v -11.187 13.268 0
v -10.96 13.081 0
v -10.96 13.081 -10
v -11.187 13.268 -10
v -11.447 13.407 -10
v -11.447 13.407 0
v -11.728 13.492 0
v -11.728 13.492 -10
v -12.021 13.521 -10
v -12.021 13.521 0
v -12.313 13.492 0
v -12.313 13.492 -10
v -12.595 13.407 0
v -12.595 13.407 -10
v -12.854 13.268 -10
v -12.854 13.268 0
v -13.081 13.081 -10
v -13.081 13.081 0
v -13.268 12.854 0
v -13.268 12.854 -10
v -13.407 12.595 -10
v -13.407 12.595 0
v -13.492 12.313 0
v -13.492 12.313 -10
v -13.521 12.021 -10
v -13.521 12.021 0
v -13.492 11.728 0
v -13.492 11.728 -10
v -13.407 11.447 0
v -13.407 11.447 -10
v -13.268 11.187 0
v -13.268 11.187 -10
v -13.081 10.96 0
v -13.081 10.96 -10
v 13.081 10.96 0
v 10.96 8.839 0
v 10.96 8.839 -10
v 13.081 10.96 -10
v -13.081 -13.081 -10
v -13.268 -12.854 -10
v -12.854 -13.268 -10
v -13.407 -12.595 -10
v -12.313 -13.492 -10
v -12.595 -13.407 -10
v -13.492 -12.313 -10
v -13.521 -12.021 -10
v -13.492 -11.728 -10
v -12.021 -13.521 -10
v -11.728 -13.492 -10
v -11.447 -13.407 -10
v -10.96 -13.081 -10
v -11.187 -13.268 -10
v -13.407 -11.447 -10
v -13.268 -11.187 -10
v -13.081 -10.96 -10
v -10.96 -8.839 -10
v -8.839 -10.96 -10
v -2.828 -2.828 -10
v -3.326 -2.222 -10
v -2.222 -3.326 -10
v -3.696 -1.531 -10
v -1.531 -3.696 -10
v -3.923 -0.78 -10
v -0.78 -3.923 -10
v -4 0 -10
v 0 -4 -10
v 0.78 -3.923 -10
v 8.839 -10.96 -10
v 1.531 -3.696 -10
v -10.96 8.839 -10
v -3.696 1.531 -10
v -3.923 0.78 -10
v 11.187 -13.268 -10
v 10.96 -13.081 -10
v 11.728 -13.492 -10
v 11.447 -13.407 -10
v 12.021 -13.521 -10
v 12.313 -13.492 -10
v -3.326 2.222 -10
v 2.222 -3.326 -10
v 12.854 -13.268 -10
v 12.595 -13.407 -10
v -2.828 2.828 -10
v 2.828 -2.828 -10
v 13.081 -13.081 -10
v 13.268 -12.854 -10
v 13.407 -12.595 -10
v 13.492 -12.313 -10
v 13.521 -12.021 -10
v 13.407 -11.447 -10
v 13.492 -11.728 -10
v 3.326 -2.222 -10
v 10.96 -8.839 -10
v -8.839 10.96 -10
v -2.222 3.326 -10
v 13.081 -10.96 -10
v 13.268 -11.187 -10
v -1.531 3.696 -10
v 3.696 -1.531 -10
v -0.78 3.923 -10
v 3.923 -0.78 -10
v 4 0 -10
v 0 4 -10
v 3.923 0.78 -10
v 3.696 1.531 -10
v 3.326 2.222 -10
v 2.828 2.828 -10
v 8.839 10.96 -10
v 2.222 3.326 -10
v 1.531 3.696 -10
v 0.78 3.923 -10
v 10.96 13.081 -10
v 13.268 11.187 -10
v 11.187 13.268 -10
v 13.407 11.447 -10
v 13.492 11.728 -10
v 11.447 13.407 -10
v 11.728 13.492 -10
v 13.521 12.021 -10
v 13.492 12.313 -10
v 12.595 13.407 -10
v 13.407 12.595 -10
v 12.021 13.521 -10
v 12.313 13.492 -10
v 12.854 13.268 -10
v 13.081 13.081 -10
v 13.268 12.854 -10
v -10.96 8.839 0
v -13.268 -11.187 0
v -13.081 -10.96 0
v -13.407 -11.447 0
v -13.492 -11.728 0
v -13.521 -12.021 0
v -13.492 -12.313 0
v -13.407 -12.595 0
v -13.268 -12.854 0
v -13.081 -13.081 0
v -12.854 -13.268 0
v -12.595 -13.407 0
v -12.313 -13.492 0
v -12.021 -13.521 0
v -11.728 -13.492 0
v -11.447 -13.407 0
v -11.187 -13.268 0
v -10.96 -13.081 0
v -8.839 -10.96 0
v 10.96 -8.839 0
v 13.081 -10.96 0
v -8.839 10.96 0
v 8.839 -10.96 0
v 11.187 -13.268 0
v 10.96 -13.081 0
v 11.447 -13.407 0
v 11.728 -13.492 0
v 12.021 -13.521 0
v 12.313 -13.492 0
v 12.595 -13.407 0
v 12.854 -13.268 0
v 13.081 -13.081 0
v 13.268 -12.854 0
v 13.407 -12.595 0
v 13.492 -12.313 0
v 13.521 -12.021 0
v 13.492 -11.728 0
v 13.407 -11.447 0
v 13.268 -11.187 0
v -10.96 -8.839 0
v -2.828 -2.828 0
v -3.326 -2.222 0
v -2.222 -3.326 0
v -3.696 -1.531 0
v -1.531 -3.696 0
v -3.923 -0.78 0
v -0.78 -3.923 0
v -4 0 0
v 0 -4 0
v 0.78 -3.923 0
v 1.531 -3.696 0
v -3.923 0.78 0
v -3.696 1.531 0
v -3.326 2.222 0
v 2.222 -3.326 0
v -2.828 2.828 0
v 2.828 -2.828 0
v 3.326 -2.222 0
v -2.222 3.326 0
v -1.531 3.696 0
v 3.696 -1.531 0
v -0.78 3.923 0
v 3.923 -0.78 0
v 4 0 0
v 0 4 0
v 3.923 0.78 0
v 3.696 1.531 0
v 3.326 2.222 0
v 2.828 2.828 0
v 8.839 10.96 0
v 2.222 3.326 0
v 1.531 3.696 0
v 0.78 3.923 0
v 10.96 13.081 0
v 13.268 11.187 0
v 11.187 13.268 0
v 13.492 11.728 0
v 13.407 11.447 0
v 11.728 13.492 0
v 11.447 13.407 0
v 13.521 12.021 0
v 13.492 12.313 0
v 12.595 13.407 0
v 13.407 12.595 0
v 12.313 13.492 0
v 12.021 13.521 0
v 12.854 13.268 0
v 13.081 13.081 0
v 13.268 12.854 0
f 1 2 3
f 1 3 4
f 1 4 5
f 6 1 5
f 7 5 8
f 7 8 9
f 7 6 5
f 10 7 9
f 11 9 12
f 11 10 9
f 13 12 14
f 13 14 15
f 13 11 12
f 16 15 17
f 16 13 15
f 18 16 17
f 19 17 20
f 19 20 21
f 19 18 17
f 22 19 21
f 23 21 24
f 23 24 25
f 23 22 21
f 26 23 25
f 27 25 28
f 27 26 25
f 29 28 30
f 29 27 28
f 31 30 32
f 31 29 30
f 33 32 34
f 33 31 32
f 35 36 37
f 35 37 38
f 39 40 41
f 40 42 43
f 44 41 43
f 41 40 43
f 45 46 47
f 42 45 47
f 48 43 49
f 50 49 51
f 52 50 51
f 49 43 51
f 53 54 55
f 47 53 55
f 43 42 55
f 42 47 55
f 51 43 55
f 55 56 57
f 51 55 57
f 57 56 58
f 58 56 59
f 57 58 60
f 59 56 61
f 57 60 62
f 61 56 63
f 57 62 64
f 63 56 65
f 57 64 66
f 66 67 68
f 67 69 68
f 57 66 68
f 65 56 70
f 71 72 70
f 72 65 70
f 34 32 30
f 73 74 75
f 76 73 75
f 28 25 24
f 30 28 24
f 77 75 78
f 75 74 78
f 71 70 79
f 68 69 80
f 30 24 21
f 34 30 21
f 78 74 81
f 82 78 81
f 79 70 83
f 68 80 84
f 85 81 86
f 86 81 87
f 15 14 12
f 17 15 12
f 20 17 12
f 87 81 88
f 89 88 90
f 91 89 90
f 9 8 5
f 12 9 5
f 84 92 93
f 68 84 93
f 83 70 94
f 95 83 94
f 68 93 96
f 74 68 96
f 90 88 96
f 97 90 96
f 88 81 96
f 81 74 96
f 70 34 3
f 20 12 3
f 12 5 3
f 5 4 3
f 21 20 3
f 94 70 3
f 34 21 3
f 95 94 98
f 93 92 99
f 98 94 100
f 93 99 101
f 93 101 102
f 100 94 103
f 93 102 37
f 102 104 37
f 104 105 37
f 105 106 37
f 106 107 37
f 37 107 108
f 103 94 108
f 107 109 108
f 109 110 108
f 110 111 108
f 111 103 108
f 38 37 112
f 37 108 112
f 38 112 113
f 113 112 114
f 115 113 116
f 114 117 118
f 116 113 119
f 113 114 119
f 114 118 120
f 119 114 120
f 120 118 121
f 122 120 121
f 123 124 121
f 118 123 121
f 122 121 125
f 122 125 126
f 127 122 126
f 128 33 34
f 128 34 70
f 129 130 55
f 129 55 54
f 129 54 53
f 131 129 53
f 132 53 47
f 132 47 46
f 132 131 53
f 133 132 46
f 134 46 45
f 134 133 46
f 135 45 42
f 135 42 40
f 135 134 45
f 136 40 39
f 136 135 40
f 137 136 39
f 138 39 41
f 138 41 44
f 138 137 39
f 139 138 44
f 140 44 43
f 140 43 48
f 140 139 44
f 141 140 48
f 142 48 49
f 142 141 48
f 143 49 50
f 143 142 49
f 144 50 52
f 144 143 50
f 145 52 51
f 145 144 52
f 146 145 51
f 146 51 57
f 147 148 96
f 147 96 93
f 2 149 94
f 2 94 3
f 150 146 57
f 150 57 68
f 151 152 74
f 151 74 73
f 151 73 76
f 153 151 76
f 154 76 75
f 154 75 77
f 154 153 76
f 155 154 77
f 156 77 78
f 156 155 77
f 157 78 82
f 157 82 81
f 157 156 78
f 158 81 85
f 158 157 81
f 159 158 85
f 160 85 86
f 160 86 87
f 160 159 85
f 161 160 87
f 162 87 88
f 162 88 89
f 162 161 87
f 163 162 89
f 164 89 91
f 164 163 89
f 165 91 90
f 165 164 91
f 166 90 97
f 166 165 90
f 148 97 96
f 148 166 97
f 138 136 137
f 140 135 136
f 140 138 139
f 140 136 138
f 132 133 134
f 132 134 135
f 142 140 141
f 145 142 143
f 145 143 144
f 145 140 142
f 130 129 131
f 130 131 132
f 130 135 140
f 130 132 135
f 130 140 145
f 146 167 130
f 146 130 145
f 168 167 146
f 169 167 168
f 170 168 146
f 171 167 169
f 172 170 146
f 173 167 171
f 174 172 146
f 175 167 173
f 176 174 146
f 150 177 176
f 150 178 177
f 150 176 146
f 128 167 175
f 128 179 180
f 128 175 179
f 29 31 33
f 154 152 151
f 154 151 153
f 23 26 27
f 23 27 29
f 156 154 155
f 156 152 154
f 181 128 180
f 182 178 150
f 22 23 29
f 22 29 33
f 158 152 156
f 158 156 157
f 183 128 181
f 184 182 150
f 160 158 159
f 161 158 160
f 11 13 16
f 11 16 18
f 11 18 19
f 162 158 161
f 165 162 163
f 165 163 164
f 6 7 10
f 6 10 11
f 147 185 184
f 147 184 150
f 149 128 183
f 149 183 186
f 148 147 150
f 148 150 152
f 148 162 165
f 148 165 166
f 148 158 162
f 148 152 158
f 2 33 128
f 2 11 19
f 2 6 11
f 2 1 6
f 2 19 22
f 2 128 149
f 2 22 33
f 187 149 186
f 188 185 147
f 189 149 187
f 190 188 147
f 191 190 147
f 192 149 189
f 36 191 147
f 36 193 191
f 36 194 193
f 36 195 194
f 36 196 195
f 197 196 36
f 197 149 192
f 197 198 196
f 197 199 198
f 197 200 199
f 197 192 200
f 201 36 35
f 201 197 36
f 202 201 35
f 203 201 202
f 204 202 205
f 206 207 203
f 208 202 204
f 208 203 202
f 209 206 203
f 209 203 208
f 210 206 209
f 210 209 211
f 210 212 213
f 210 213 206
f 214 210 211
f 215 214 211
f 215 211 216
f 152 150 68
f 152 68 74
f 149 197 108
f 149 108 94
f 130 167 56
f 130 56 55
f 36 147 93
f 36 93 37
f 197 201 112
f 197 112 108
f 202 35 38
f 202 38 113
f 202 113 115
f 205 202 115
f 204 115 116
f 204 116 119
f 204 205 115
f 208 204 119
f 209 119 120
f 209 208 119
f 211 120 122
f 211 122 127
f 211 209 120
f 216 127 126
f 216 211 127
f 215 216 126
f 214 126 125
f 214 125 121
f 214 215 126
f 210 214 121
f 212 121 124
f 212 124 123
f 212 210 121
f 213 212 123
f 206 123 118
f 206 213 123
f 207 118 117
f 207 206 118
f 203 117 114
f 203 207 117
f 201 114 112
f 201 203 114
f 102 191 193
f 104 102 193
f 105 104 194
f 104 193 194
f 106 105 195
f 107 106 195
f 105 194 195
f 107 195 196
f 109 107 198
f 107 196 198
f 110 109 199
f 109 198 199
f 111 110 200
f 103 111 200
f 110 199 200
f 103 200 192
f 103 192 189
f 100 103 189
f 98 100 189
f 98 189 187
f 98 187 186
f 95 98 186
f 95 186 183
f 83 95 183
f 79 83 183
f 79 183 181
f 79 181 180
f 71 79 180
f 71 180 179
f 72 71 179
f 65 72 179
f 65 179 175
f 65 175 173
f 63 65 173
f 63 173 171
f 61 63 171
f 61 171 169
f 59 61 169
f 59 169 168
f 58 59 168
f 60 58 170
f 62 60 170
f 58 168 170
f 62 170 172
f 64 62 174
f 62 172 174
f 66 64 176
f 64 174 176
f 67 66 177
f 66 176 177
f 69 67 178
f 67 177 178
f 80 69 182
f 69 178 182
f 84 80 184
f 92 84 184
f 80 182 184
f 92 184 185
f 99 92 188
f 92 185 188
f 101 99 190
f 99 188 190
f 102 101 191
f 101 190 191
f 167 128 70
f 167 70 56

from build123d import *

# Parameters (mm, degrees)
BOSS_EXTRUDE1_DEPTH = 10
SKETCH4_R           = 4
CUT_EXTRUDE1_DEPTH  = 11


with BuildPart() as part:
    # Sketch3 → Boss-Extrude1 (new body)
    with BuildSketch(Plane.XY):
        with BuildLine():
            Line((-13.081475452, 10.960155108), (-10.960155108, 8.838834765))
            Line((-10.960155108, 8.838834765), (-10.960155108, -8.838834765))
            Line((-10.960155108, -8.838834765), (-13.081475452, -10.960155108))
            ThreePointArc((-13.081475452, -10.960155108), (-13.081475452, -13.081475452), (-10.960155108, -13.081475452))
            Line((-10.960155108, -13.081475452), (-8.838834765, -10.960155108))
            Line((-8.838834765, -10.960155108), (8.838834765, -10.960155108))
            Line((8.838834765, -10.960155108), (10.960155108, -13.081475452))
            ThreePointArc((10.960155108, -13.081475452), (13.081475452, -13.081475452), (13.081475452, -10.960155108))
            Line((13.081475452, -10.960155108), (10.960155108, -8.838834765))
            Line((10.960155108, -8.838834765), (10.960155108, 8.838834765))
            Line((10.960155108, 8.838834765), (13.081475452, 10.960155108))
            ThreePointArc((13.081475452, 10.960155108), (13.081475452, 13.081475452), (10.960155108, 13.081475452))
            Line((10.960155108, 13.081475452), (8.838834765, 10.960155108))
            Line((8.838834765, 10.960155108), (-8.838834765, 10.960155108))
            Line((-8.838834765, 10.960155108), (-10.960155108, 13.081475452))
            ThreePointArc((-10.960155108, 13.081475452), (-13.081475452, 13.081475452), (-13.081475452, 10.960155108))
        make_face()
    extrude(amount=-BOSS_EXTRUDE1_DEPTH)

    # Sketch4 → Cut-Extrude1 (cut, through all)
    with BuildSketch(Plane.XY):
        Circle(SKETCH4_R)
    extrude(amount=-CUT_EXTRUDE1_DEPTH, mode=Mode.SUBTRACT)


solid = part.part
